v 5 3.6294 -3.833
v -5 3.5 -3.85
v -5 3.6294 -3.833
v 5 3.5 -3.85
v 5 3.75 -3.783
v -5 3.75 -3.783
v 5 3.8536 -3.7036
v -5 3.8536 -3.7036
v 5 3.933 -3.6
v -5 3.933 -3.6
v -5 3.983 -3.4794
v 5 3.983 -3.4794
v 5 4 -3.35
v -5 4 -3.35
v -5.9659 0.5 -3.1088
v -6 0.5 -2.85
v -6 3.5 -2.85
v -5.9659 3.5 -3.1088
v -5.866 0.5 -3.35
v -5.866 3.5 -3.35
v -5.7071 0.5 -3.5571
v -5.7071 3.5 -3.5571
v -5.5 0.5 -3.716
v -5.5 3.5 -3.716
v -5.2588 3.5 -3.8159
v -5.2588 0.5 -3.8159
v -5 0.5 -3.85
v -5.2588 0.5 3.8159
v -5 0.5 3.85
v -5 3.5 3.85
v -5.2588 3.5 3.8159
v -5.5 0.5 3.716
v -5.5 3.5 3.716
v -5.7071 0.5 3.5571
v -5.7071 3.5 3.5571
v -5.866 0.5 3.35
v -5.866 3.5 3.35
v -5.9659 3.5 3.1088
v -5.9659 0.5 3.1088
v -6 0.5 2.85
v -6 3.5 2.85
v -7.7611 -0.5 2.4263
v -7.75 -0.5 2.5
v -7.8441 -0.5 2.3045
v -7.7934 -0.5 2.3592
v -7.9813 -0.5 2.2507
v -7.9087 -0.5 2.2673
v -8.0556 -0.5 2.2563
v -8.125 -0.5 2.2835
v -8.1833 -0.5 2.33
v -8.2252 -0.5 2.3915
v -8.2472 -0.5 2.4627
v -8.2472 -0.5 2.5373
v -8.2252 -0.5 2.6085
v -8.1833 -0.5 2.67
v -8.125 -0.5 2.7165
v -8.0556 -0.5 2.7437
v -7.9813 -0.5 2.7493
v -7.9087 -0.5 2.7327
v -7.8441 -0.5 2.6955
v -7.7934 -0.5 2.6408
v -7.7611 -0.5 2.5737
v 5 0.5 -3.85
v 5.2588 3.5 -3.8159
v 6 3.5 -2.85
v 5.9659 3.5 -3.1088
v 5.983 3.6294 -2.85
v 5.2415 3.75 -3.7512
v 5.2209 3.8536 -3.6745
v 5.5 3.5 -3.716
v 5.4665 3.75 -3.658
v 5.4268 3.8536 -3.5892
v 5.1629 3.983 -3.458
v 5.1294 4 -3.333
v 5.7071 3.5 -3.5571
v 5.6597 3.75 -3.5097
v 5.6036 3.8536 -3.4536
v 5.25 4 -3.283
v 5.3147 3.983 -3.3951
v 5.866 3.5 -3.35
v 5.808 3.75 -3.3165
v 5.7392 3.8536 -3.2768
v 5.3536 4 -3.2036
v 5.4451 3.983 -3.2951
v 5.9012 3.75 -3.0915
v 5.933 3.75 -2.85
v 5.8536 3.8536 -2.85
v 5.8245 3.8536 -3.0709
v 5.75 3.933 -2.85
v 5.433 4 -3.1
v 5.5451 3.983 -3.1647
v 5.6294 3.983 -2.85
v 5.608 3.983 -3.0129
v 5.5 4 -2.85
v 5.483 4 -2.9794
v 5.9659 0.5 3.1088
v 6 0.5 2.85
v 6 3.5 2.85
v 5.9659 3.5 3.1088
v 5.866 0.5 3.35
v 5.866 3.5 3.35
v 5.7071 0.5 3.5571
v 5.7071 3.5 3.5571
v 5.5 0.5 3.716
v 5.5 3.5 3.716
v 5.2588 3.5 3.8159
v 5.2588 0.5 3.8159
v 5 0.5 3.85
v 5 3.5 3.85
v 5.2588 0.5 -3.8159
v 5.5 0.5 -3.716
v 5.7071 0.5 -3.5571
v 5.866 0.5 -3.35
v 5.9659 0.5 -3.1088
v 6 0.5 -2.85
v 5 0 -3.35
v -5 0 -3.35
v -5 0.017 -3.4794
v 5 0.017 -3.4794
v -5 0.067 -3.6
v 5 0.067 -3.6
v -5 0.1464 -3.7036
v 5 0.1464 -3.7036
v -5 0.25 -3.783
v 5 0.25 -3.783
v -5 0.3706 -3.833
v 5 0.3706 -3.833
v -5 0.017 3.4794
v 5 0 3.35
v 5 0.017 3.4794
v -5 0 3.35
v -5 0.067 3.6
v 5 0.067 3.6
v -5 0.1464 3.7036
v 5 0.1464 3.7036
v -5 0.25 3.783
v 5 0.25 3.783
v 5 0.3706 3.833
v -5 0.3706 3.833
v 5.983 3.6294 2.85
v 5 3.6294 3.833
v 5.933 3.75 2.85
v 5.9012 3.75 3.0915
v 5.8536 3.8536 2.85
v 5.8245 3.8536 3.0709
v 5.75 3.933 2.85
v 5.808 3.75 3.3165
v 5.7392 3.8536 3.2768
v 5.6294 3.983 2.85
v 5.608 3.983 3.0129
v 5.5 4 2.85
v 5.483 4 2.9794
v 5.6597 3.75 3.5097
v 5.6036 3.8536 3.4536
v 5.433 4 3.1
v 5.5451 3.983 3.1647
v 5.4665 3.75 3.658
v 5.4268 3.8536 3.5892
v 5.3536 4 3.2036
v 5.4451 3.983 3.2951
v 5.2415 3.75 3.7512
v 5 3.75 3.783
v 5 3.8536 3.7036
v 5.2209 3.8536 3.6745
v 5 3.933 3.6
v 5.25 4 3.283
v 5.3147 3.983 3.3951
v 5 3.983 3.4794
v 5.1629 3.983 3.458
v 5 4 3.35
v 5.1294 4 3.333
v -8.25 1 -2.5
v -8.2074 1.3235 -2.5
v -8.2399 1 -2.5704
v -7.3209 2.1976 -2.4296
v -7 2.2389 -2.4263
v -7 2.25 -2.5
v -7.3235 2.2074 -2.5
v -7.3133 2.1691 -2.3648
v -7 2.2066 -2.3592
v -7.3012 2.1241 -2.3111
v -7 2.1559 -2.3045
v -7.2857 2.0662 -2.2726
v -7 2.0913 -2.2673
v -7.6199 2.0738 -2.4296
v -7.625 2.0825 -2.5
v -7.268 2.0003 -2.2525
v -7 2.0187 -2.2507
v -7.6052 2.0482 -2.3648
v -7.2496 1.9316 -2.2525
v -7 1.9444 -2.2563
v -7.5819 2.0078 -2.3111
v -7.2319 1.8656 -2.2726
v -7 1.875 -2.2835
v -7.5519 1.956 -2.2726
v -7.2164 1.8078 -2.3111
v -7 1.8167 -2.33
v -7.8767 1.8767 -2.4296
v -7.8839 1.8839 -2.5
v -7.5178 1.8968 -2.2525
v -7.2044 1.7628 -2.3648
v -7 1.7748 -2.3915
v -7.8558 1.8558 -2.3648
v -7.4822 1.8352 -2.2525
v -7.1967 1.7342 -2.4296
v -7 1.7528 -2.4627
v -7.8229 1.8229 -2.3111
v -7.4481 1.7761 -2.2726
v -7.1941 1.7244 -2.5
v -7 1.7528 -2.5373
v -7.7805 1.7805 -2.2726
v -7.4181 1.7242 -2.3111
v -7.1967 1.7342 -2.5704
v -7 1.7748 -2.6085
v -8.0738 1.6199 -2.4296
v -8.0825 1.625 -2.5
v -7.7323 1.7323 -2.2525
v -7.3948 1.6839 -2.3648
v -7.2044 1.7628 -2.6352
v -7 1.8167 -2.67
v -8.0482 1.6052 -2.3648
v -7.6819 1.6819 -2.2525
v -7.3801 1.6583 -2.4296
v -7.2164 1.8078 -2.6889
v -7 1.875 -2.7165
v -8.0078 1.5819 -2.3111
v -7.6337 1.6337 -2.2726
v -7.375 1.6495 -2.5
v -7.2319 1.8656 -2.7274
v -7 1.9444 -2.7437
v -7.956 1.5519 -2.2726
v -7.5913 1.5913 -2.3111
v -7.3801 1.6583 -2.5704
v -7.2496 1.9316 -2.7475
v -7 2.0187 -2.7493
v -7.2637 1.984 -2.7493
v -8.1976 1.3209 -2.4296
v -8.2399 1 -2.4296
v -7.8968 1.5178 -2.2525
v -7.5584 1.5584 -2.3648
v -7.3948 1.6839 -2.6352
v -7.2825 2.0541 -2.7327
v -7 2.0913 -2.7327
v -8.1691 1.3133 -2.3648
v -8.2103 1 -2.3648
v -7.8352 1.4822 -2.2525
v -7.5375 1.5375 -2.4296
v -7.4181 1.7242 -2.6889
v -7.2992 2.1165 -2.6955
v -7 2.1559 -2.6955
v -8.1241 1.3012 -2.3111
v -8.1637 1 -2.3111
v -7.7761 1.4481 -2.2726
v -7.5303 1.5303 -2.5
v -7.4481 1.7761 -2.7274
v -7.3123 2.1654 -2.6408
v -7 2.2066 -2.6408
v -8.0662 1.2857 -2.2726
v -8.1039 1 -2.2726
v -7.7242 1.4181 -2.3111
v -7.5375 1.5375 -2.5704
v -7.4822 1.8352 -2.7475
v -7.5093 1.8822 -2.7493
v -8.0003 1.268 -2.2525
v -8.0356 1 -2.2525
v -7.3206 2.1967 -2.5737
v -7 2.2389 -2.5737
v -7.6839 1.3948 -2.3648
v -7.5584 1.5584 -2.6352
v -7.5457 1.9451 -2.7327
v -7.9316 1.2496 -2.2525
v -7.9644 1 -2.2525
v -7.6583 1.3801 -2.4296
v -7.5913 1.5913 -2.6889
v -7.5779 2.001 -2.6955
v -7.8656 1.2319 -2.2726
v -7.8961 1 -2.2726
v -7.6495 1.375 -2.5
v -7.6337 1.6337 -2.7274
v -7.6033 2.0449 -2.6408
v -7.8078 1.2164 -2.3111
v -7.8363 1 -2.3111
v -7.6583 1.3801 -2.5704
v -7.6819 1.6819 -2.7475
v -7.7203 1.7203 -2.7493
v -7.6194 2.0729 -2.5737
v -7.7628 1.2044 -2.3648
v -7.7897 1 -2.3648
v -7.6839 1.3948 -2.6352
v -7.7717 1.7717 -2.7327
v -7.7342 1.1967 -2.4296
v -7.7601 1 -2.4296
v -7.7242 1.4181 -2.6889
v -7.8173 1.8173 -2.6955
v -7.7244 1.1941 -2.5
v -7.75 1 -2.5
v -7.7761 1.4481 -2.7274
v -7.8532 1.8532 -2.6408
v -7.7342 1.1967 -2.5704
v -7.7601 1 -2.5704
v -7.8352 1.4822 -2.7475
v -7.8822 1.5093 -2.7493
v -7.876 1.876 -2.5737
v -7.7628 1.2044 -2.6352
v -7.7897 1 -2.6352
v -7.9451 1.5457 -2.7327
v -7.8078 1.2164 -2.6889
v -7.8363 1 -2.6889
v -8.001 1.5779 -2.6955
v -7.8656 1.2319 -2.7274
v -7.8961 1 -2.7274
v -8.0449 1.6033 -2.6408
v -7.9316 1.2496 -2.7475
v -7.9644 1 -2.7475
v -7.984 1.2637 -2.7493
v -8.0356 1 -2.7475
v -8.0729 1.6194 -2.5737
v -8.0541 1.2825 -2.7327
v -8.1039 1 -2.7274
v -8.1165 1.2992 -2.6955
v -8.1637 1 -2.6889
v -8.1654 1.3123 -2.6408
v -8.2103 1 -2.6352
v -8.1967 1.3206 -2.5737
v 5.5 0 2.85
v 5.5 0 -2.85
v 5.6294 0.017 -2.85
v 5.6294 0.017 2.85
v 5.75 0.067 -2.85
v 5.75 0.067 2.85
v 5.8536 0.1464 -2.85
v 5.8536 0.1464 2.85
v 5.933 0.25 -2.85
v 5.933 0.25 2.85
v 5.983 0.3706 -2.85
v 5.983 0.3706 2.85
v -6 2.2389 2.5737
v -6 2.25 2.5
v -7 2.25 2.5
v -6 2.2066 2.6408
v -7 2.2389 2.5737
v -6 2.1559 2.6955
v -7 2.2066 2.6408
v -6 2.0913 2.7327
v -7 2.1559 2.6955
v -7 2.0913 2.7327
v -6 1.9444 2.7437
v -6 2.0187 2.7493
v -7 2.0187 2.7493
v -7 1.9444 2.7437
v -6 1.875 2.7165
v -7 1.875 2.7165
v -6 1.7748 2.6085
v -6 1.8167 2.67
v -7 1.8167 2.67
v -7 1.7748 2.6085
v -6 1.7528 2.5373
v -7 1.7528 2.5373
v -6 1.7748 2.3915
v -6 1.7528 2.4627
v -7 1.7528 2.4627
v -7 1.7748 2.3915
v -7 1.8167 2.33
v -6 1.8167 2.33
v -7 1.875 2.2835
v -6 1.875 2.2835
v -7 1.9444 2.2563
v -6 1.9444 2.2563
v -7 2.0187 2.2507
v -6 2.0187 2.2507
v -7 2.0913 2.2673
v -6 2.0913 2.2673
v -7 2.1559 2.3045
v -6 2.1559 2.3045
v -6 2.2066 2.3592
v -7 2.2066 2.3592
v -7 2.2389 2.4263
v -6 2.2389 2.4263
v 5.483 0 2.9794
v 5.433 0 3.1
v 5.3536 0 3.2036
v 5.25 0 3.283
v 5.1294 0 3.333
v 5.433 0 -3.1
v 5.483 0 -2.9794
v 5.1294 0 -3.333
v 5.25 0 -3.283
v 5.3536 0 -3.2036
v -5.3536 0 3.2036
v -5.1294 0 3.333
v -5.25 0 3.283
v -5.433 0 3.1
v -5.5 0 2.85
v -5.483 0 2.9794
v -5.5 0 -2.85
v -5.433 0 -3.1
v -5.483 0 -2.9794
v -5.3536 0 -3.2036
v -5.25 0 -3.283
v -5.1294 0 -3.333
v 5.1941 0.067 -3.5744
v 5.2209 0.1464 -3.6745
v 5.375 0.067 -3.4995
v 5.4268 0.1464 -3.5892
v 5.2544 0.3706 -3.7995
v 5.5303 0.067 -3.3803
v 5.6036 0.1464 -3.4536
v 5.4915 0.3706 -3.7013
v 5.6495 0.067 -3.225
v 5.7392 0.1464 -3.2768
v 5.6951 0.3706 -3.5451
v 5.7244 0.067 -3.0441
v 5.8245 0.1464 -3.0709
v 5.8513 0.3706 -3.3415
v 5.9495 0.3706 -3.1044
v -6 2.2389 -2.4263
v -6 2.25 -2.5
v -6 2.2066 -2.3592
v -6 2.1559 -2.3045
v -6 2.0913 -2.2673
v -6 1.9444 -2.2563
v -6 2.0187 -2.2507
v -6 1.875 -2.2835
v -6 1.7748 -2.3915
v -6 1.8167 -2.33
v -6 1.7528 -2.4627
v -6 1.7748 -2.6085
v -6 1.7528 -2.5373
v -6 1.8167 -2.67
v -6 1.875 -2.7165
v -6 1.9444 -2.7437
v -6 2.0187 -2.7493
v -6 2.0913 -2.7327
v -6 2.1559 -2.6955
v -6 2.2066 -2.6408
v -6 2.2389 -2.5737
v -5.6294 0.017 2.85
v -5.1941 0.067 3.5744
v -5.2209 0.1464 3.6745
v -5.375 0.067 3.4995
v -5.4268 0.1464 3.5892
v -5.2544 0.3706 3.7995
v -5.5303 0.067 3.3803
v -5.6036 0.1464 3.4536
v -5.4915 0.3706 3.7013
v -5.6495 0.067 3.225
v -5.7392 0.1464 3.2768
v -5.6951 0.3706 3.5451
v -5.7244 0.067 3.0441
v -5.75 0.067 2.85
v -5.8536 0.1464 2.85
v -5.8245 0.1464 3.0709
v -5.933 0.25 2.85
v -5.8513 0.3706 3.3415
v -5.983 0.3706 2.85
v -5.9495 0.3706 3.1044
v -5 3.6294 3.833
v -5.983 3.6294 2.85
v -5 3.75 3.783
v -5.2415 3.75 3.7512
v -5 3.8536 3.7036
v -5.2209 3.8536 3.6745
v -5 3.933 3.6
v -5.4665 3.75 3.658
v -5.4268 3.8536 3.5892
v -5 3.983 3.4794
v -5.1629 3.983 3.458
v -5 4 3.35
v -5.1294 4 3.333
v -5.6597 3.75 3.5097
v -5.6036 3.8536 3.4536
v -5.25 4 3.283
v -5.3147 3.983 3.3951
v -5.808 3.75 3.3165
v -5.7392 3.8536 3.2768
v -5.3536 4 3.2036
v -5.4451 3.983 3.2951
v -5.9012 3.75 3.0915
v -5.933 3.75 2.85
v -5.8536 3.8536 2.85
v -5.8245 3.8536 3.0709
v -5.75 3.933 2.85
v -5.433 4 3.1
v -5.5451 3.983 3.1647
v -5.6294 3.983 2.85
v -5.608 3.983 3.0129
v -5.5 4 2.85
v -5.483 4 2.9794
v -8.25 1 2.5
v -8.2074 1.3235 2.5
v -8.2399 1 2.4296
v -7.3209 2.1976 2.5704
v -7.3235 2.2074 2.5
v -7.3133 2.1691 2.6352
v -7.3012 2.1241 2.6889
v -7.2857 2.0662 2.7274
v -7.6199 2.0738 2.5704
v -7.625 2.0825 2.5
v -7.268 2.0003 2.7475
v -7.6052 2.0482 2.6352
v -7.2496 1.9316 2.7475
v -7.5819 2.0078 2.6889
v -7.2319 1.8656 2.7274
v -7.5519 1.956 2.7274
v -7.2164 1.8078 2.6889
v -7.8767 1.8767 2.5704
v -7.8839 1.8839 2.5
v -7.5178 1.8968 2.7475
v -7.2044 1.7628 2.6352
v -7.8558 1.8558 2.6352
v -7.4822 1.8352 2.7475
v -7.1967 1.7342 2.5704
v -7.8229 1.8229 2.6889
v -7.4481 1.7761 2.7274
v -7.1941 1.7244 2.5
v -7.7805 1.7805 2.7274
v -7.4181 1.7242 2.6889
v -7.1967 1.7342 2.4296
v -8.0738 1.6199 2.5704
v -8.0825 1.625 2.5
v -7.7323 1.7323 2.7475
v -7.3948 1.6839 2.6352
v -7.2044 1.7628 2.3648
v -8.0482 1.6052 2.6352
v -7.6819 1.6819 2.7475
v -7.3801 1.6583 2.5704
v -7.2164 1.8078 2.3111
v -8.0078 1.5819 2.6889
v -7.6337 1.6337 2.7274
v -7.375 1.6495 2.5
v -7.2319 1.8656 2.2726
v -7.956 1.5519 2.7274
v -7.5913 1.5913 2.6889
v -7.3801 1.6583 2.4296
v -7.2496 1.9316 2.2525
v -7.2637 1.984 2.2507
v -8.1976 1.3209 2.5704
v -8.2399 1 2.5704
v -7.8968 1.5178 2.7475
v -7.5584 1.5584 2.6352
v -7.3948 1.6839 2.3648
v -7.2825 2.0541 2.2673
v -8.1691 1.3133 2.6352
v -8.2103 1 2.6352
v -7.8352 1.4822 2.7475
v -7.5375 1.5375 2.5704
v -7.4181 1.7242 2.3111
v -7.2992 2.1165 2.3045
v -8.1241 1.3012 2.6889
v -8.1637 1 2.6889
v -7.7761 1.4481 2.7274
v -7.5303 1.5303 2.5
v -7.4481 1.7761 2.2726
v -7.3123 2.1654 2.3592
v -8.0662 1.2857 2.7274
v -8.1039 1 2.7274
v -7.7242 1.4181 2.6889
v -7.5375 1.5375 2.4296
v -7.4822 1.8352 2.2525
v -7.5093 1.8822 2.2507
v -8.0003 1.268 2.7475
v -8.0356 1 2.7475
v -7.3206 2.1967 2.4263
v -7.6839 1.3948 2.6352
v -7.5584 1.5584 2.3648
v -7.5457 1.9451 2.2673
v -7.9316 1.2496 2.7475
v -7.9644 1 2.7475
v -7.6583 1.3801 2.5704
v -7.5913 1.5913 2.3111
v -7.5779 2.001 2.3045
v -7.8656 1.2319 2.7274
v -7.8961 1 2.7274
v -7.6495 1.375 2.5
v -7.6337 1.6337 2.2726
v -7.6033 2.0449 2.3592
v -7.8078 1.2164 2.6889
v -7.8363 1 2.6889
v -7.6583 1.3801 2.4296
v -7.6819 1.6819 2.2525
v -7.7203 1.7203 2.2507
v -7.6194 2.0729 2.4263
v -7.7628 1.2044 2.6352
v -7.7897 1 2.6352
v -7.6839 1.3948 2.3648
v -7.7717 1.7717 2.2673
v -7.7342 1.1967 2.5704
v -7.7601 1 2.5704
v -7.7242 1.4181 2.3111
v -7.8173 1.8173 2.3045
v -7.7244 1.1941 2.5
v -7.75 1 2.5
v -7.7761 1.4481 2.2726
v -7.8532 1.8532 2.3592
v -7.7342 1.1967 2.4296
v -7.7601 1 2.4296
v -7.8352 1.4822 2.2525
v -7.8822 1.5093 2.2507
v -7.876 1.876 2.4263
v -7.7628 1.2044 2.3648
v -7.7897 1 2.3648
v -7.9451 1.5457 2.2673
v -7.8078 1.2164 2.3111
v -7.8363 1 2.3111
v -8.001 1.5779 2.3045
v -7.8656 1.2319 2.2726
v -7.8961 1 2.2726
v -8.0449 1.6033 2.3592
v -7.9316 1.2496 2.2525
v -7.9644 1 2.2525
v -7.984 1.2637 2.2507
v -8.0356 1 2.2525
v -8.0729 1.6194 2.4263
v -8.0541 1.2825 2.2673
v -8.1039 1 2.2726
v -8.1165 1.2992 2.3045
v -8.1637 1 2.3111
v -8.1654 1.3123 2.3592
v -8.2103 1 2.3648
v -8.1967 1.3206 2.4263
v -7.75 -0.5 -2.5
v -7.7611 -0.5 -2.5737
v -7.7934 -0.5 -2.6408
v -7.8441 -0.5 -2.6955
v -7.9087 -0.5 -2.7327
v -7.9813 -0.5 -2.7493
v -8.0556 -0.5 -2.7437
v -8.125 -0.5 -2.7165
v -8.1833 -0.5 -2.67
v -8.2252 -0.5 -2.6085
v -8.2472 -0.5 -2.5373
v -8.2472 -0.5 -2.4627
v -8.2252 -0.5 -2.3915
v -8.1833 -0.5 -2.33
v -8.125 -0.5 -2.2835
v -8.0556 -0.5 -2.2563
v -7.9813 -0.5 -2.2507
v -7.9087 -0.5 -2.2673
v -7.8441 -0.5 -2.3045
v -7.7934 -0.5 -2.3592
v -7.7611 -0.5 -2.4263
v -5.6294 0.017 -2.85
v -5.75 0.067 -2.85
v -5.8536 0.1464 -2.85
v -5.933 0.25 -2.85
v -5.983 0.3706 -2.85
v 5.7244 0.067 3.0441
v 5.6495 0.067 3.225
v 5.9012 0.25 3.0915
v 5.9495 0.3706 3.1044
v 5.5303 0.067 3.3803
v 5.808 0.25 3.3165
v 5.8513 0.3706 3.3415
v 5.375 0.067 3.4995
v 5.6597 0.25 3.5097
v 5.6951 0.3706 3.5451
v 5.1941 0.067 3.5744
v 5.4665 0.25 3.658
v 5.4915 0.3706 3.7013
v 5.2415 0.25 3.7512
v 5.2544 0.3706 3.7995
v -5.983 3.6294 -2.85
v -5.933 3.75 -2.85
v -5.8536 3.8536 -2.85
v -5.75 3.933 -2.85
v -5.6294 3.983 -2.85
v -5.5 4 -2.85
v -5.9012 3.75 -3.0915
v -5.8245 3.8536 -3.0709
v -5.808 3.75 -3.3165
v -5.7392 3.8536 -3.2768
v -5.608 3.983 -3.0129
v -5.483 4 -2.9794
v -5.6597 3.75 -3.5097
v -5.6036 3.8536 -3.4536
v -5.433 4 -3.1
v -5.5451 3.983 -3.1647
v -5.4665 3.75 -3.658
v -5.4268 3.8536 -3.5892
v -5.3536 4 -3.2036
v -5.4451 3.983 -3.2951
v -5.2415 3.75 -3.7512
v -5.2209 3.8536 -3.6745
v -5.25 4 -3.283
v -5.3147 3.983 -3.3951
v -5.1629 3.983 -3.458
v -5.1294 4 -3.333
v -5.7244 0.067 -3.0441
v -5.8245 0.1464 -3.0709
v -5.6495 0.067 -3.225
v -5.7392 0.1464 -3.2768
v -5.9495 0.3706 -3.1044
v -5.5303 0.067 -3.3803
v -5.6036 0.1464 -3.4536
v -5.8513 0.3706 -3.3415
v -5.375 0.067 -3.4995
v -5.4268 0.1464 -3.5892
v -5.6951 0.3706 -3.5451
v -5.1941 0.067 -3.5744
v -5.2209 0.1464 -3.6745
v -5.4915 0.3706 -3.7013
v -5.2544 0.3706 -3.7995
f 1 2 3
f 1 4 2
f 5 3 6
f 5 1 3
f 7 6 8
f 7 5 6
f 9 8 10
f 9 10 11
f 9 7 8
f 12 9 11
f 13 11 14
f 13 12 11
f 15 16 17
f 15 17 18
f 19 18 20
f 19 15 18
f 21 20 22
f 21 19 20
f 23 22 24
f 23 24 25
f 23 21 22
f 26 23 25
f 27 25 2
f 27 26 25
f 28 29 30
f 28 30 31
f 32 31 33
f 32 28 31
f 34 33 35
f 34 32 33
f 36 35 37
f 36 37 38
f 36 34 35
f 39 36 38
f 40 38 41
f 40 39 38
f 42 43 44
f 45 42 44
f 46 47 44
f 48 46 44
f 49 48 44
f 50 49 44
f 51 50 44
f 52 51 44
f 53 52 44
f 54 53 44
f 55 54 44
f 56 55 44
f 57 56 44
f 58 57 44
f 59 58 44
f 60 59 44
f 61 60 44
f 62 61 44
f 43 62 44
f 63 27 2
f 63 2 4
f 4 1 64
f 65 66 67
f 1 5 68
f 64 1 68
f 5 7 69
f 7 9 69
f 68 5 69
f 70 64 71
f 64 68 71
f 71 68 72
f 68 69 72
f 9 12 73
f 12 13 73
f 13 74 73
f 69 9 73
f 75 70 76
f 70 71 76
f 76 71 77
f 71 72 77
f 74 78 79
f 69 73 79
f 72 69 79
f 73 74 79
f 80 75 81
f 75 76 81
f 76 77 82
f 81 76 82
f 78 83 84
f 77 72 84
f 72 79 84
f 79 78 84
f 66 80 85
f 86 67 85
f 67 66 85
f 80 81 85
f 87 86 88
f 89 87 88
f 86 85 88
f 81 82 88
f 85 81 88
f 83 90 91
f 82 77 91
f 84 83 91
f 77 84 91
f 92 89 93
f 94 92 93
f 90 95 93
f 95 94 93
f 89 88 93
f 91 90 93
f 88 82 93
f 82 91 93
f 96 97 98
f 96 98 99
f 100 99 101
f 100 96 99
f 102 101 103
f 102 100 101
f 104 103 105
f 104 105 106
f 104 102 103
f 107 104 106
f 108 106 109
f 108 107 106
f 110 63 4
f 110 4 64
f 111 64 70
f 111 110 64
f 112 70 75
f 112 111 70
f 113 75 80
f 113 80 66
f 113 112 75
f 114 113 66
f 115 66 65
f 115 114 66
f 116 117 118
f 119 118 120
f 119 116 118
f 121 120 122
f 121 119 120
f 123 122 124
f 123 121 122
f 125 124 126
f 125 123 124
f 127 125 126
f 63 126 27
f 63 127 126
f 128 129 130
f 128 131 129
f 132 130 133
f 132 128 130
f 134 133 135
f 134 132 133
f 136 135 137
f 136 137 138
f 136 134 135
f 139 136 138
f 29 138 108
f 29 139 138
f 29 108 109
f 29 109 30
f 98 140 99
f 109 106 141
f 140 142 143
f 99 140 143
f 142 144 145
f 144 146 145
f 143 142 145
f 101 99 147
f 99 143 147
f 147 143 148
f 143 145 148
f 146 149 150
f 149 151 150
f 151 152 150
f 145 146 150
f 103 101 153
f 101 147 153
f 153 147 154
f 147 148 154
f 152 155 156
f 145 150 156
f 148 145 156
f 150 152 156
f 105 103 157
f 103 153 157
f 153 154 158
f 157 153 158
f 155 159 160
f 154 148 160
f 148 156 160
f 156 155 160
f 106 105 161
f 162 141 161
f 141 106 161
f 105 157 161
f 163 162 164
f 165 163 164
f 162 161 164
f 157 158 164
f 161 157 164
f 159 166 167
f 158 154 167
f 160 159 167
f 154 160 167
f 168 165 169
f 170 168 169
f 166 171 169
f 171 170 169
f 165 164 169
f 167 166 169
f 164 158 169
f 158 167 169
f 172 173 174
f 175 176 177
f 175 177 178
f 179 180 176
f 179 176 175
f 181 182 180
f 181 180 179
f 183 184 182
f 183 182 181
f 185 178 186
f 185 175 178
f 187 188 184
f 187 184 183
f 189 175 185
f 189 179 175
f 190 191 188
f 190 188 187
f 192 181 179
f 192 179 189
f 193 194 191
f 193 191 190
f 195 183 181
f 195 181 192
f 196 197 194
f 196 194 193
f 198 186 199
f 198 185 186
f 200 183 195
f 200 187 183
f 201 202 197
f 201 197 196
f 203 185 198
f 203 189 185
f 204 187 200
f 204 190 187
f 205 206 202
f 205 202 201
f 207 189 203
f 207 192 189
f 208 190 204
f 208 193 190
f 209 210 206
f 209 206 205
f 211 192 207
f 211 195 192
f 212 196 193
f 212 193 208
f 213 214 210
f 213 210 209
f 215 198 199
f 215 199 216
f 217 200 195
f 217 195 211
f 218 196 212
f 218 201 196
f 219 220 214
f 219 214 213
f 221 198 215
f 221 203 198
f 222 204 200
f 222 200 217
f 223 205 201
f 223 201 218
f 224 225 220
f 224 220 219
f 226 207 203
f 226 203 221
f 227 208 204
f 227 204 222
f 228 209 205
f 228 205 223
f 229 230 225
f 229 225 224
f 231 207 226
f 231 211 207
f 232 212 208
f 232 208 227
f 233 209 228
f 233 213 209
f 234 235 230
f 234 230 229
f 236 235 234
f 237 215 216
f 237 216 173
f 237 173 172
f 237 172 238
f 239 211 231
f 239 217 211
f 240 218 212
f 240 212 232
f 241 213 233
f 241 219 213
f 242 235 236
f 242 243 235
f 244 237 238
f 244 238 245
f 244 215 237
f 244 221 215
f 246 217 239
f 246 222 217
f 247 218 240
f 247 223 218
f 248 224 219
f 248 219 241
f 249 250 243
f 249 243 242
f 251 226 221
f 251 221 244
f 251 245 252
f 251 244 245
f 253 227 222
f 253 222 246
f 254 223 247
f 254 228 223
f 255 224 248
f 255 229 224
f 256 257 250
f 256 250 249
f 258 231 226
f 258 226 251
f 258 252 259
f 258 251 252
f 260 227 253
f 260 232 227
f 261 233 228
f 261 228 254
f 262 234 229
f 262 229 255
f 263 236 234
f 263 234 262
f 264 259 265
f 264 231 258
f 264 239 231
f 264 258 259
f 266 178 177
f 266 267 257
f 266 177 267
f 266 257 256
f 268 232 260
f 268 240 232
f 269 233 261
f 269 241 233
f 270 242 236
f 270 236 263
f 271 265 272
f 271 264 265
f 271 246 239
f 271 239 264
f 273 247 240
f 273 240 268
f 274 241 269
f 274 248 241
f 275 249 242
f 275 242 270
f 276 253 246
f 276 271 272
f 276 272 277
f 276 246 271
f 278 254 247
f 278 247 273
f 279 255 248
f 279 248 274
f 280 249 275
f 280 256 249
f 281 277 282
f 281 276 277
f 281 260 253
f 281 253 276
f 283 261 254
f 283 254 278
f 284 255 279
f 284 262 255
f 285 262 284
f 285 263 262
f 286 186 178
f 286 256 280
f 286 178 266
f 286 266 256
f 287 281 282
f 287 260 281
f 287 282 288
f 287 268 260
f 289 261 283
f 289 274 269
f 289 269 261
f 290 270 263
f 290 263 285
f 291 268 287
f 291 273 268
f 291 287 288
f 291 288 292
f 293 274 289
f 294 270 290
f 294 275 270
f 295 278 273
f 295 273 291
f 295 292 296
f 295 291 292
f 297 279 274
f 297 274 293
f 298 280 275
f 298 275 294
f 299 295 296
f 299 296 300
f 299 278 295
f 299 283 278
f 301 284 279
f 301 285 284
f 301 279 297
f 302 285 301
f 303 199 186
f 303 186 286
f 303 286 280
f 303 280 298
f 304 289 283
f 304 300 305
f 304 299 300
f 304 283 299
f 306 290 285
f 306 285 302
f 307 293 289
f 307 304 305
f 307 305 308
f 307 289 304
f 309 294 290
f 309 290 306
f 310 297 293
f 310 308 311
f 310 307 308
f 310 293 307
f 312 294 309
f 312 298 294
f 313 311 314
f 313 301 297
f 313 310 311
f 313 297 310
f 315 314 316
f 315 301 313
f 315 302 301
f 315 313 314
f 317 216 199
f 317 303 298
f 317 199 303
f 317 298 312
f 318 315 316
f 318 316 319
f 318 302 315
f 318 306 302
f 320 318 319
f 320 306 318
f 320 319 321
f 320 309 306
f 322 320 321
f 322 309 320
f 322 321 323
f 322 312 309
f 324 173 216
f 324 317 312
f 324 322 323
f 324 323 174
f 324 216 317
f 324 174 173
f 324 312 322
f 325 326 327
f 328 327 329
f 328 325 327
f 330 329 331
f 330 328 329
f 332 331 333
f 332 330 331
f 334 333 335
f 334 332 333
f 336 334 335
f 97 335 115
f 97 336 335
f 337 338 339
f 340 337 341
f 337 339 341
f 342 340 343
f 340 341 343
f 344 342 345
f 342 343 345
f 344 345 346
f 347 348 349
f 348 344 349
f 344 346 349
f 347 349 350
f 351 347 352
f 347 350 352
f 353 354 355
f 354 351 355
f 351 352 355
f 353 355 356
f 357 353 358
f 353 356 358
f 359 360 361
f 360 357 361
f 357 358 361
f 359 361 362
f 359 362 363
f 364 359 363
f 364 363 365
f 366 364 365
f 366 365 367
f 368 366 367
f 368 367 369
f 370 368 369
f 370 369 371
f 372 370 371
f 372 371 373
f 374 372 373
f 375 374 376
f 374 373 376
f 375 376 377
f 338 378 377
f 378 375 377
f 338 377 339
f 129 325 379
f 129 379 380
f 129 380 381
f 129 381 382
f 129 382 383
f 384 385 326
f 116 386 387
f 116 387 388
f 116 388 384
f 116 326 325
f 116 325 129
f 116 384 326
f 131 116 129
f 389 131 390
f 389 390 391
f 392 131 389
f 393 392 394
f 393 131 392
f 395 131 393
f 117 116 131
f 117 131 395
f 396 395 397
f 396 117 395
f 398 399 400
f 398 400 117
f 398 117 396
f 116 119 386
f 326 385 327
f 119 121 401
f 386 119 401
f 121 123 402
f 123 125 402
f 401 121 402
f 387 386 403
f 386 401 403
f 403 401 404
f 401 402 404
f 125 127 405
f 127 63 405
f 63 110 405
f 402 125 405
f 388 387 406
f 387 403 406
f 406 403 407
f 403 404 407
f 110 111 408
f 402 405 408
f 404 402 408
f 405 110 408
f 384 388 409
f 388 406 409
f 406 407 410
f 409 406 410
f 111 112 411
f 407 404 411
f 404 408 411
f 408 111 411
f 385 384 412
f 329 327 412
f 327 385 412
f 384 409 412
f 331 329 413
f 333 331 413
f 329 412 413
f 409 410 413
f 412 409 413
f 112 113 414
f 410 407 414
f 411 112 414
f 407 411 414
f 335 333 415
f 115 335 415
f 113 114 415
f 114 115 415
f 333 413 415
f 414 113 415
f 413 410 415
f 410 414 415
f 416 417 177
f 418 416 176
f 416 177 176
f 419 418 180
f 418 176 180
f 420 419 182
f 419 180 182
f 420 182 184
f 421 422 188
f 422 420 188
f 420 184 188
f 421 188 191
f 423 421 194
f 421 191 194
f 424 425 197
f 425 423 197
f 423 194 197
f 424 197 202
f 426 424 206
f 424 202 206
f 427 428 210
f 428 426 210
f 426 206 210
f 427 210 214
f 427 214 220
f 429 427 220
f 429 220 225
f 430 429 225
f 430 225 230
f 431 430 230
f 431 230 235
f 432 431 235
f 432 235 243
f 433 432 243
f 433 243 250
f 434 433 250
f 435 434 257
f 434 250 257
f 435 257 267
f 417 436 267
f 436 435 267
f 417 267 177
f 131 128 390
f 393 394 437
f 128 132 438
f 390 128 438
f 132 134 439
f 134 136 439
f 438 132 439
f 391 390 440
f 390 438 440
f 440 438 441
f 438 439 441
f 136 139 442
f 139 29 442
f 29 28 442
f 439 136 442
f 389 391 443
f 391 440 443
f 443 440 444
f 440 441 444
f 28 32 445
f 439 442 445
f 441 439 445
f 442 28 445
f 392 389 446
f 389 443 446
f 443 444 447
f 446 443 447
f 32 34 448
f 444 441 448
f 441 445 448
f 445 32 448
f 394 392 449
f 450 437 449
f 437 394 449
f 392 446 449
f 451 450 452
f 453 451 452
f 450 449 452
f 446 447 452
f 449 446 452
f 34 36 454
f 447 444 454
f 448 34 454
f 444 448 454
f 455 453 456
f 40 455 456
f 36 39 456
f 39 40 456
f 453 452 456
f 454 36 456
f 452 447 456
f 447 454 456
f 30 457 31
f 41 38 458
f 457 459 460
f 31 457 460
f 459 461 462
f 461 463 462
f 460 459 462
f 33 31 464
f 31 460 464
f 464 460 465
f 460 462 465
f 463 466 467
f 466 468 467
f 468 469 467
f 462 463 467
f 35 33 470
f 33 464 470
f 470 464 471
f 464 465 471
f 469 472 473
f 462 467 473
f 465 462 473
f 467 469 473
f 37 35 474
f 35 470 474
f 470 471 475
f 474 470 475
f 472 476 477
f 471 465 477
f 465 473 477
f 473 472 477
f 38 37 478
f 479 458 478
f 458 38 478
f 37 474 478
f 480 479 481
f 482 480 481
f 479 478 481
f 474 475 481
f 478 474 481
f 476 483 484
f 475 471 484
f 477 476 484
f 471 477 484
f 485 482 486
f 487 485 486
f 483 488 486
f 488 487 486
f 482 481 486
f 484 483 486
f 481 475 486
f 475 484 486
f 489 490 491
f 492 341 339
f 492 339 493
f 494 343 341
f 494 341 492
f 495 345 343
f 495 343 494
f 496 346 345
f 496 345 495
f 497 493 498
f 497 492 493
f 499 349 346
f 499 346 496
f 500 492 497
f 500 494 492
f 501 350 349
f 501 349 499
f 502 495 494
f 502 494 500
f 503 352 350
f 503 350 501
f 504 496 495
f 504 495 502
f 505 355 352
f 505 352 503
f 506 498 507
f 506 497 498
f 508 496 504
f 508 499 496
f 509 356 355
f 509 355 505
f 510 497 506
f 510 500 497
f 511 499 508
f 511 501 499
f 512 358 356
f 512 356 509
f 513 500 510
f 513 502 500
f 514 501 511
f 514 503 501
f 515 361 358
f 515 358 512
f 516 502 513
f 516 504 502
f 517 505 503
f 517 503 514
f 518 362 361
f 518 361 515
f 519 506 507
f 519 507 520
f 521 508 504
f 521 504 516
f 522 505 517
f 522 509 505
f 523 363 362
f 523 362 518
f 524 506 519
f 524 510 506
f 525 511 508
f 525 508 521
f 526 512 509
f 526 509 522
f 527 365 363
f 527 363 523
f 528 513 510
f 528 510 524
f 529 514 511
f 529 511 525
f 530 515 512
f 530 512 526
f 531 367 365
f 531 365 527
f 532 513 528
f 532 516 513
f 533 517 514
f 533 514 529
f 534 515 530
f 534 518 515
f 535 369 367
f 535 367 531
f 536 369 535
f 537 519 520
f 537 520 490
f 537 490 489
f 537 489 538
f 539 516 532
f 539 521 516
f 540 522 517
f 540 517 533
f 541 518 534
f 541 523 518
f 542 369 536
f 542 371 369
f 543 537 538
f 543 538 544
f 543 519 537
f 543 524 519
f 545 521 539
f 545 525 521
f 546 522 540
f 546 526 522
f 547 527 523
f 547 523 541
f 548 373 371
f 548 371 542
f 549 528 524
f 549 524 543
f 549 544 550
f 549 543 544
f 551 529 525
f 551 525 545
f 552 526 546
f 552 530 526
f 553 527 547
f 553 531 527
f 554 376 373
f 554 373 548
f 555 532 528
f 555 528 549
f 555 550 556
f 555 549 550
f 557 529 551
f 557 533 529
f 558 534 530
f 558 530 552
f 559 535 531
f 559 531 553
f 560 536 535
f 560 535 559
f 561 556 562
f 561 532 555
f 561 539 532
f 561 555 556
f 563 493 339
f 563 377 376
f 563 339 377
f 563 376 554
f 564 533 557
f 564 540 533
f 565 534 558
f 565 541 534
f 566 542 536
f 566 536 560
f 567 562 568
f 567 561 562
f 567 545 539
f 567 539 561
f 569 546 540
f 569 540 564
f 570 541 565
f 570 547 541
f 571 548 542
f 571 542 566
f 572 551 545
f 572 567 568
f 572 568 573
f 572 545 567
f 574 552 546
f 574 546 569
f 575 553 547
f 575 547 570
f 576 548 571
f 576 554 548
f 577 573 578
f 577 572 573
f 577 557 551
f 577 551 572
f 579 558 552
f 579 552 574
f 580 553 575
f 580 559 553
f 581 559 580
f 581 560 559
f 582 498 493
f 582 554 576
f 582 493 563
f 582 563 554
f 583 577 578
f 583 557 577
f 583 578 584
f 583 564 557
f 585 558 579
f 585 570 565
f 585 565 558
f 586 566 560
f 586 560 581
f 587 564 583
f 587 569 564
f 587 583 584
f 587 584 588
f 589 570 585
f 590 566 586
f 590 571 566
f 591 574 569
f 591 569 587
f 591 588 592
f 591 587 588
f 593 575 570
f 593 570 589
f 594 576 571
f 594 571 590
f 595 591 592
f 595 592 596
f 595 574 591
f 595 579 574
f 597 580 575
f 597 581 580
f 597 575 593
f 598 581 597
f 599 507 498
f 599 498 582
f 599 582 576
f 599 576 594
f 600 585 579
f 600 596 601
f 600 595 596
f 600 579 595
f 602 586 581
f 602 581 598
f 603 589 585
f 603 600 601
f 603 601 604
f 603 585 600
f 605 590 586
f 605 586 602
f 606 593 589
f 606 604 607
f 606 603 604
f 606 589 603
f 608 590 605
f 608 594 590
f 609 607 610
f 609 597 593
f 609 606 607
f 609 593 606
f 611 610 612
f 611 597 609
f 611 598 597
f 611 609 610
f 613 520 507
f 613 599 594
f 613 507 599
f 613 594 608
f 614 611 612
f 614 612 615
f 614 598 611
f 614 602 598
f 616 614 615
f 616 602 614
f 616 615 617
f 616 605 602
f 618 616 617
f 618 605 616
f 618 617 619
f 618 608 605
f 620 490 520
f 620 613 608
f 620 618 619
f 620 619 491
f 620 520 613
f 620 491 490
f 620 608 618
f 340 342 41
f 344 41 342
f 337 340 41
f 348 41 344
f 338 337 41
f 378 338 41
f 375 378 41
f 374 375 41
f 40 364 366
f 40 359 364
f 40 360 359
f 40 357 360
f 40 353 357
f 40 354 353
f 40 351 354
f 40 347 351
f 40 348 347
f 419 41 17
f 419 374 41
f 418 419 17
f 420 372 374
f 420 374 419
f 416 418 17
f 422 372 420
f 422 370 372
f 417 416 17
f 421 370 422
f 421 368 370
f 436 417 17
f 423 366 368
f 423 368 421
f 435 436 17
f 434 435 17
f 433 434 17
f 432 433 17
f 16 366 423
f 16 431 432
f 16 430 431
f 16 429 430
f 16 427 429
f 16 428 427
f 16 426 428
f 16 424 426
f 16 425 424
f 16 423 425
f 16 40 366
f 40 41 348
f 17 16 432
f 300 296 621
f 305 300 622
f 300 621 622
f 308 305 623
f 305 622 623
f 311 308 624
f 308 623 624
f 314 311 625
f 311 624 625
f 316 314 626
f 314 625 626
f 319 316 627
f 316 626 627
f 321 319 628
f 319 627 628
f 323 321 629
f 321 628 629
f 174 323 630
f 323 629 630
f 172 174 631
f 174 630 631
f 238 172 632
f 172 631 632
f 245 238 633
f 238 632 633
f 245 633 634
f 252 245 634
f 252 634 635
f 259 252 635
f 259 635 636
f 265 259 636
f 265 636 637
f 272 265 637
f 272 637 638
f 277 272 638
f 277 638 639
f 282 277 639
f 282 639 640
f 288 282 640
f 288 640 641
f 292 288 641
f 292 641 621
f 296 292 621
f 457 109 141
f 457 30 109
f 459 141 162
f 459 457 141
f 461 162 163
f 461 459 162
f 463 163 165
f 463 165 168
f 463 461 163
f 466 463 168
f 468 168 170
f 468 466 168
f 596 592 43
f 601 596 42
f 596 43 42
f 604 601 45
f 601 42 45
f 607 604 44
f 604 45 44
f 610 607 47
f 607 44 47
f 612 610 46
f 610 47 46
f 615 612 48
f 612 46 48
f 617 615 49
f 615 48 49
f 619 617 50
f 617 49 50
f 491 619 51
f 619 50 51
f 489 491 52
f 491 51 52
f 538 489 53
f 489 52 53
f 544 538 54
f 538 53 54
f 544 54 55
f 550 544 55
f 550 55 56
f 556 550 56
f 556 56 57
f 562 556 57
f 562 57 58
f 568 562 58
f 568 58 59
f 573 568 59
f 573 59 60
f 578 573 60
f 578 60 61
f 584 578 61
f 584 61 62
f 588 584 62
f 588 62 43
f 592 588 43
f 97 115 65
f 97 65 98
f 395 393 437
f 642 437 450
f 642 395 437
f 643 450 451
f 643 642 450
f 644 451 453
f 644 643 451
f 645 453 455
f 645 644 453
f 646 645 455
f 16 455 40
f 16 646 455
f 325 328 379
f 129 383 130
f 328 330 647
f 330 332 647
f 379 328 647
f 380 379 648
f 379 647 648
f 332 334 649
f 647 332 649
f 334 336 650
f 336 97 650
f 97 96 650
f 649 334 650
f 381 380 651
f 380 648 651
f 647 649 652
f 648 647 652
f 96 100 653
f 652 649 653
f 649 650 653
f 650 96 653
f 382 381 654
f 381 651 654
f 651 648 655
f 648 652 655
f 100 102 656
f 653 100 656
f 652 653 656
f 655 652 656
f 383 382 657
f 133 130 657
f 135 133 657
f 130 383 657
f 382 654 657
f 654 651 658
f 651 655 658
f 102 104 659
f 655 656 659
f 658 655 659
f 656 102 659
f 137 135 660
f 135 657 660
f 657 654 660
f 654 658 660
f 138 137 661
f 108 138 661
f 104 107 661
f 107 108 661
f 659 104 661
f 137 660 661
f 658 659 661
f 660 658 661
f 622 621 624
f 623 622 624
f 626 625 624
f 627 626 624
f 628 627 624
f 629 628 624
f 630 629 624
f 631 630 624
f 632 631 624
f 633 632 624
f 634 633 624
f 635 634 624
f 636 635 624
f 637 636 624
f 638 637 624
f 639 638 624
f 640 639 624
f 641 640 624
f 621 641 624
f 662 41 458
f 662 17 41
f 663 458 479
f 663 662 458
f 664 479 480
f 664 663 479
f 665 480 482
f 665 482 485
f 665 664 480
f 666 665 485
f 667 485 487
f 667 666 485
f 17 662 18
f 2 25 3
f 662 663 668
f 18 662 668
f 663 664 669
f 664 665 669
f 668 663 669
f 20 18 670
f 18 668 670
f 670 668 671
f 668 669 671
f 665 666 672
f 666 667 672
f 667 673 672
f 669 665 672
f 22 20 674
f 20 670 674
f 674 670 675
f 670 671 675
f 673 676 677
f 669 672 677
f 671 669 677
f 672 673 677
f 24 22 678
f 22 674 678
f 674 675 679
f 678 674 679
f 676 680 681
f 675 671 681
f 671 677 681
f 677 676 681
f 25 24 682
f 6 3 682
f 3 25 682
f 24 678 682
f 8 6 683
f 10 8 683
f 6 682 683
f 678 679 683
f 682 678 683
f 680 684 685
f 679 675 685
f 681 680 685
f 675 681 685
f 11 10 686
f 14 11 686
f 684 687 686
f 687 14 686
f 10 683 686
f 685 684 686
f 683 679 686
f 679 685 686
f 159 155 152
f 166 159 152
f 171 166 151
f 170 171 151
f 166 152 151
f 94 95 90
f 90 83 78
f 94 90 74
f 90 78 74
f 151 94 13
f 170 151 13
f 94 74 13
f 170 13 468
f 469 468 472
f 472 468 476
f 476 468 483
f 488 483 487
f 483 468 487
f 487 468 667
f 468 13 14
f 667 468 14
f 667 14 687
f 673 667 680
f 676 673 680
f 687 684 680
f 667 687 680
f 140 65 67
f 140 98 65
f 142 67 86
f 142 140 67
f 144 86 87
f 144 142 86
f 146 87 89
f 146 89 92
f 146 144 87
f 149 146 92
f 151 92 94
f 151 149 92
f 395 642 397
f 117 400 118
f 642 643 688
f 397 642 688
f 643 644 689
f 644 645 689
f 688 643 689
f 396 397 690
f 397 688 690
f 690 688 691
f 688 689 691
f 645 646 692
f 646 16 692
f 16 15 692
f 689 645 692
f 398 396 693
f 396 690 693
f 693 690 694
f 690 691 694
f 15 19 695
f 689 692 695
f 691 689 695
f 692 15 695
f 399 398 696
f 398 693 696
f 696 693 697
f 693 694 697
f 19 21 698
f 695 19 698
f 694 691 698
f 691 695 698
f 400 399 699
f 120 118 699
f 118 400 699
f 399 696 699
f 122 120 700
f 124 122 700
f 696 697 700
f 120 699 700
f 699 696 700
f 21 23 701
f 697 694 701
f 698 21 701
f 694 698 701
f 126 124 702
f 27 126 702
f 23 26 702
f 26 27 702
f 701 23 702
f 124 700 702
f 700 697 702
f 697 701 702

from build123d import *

# Parameters (mm, degrees)
EXTRUDE_1_DEPTH = 4
SKETCH_2_R      = 0.25
FILLET_1_R      = 0.5
FILLET_2_R      = 0.5


with BuildPart() as part:
    # Эскиз1 → Бобышка-Вытянуть1 (new body)
    with BuildSketch(Plane(origin=(0, 0, 0), x_dir=(1, 0, 0), z_dir=(0, 1, 0))):
        with BuildLine():
            Line((-5, 3.85), (5, 3.85))
            ThreePointArc((5, 3.85), (5.707106781, 3.557106781), (6, 2.85))
            Line((6, 2.85), (6, -2.85))
            ThreePointArc((6, -2.85), (5.707106781, -3.557106781), (5, -3.85))
            Line((5, -3.85), (-5, -3.85))
            ThreePointArc((-5, -3.85), (-5.707106781, -3.557106781), (-6, -2.85))
            Line((-6, -2.85), (-6, 2.85))
            ThreePointArc((-6, 2.85), (-5.707106781, 3.557106781), (-5, 3.85))
        make_face()
    extrude(amount=EXTRUDE_1_DEPTH)

    # По траектории4: sweep along a curve in space
    with BuildLine() as sweep_4_path:
        Line((-6, 2, -2.5), (-7, 2, -2.5))
        ThreePointArc((-8, 1, -2.5), (-7.707106781, 1.707106781, -2.5), (-7, 2, -2.5))
        Line((-8, 1, -2.5), (-8, -0.5, -2.5))
    # Эскиз2 → По траектории4 (sweep)
    with BuildSketch(Plane.ZY.offset(6)):
        with Locations((-2.5, 2)):
            Circle(SKETCH_2_R)
        with Locations((2.5, 2)):
            Circle(SKETCH_2_R)
    sweep(path=sweep_4_path.line)

    # Скругление1
    fillet_1_edges = [part.edges().sort_by_distance(p)[0] for p in [
        (5.707106781, 4, -3.557106781),
        (6, 4, 0),
        (5.707106781, 4, 3.557106781),
        (0, 4, 3.85),
        (-5.707106781, 4, 3.557106781),
        (-6, 4, 0),
        (-5.707106781, 4, -3.557106781),
        (0, 4, -3.85),
    ]]
    fillet(fillet_1_edges, radius=FILLET_1_R)

    # Скругление2
    fillet_2_edges = [part.edges().sort_by_distance(p)[0] for p in [
        (5.707106781, 0, -3.557106781),
        (6, 0, 0),
        (5.707106781, 0, 3.557106781),
        (0, 0, 3.85),
        (-5.707106781, 0, 3.557106781),
        (-6, 0, 0),
        (-5.707106781, 0, -3.557106781),
        (0, 0, -3.85),
    ]]
    fillet(fillet_2_edges, radius=FILLET_2_R)


solid = part.part
